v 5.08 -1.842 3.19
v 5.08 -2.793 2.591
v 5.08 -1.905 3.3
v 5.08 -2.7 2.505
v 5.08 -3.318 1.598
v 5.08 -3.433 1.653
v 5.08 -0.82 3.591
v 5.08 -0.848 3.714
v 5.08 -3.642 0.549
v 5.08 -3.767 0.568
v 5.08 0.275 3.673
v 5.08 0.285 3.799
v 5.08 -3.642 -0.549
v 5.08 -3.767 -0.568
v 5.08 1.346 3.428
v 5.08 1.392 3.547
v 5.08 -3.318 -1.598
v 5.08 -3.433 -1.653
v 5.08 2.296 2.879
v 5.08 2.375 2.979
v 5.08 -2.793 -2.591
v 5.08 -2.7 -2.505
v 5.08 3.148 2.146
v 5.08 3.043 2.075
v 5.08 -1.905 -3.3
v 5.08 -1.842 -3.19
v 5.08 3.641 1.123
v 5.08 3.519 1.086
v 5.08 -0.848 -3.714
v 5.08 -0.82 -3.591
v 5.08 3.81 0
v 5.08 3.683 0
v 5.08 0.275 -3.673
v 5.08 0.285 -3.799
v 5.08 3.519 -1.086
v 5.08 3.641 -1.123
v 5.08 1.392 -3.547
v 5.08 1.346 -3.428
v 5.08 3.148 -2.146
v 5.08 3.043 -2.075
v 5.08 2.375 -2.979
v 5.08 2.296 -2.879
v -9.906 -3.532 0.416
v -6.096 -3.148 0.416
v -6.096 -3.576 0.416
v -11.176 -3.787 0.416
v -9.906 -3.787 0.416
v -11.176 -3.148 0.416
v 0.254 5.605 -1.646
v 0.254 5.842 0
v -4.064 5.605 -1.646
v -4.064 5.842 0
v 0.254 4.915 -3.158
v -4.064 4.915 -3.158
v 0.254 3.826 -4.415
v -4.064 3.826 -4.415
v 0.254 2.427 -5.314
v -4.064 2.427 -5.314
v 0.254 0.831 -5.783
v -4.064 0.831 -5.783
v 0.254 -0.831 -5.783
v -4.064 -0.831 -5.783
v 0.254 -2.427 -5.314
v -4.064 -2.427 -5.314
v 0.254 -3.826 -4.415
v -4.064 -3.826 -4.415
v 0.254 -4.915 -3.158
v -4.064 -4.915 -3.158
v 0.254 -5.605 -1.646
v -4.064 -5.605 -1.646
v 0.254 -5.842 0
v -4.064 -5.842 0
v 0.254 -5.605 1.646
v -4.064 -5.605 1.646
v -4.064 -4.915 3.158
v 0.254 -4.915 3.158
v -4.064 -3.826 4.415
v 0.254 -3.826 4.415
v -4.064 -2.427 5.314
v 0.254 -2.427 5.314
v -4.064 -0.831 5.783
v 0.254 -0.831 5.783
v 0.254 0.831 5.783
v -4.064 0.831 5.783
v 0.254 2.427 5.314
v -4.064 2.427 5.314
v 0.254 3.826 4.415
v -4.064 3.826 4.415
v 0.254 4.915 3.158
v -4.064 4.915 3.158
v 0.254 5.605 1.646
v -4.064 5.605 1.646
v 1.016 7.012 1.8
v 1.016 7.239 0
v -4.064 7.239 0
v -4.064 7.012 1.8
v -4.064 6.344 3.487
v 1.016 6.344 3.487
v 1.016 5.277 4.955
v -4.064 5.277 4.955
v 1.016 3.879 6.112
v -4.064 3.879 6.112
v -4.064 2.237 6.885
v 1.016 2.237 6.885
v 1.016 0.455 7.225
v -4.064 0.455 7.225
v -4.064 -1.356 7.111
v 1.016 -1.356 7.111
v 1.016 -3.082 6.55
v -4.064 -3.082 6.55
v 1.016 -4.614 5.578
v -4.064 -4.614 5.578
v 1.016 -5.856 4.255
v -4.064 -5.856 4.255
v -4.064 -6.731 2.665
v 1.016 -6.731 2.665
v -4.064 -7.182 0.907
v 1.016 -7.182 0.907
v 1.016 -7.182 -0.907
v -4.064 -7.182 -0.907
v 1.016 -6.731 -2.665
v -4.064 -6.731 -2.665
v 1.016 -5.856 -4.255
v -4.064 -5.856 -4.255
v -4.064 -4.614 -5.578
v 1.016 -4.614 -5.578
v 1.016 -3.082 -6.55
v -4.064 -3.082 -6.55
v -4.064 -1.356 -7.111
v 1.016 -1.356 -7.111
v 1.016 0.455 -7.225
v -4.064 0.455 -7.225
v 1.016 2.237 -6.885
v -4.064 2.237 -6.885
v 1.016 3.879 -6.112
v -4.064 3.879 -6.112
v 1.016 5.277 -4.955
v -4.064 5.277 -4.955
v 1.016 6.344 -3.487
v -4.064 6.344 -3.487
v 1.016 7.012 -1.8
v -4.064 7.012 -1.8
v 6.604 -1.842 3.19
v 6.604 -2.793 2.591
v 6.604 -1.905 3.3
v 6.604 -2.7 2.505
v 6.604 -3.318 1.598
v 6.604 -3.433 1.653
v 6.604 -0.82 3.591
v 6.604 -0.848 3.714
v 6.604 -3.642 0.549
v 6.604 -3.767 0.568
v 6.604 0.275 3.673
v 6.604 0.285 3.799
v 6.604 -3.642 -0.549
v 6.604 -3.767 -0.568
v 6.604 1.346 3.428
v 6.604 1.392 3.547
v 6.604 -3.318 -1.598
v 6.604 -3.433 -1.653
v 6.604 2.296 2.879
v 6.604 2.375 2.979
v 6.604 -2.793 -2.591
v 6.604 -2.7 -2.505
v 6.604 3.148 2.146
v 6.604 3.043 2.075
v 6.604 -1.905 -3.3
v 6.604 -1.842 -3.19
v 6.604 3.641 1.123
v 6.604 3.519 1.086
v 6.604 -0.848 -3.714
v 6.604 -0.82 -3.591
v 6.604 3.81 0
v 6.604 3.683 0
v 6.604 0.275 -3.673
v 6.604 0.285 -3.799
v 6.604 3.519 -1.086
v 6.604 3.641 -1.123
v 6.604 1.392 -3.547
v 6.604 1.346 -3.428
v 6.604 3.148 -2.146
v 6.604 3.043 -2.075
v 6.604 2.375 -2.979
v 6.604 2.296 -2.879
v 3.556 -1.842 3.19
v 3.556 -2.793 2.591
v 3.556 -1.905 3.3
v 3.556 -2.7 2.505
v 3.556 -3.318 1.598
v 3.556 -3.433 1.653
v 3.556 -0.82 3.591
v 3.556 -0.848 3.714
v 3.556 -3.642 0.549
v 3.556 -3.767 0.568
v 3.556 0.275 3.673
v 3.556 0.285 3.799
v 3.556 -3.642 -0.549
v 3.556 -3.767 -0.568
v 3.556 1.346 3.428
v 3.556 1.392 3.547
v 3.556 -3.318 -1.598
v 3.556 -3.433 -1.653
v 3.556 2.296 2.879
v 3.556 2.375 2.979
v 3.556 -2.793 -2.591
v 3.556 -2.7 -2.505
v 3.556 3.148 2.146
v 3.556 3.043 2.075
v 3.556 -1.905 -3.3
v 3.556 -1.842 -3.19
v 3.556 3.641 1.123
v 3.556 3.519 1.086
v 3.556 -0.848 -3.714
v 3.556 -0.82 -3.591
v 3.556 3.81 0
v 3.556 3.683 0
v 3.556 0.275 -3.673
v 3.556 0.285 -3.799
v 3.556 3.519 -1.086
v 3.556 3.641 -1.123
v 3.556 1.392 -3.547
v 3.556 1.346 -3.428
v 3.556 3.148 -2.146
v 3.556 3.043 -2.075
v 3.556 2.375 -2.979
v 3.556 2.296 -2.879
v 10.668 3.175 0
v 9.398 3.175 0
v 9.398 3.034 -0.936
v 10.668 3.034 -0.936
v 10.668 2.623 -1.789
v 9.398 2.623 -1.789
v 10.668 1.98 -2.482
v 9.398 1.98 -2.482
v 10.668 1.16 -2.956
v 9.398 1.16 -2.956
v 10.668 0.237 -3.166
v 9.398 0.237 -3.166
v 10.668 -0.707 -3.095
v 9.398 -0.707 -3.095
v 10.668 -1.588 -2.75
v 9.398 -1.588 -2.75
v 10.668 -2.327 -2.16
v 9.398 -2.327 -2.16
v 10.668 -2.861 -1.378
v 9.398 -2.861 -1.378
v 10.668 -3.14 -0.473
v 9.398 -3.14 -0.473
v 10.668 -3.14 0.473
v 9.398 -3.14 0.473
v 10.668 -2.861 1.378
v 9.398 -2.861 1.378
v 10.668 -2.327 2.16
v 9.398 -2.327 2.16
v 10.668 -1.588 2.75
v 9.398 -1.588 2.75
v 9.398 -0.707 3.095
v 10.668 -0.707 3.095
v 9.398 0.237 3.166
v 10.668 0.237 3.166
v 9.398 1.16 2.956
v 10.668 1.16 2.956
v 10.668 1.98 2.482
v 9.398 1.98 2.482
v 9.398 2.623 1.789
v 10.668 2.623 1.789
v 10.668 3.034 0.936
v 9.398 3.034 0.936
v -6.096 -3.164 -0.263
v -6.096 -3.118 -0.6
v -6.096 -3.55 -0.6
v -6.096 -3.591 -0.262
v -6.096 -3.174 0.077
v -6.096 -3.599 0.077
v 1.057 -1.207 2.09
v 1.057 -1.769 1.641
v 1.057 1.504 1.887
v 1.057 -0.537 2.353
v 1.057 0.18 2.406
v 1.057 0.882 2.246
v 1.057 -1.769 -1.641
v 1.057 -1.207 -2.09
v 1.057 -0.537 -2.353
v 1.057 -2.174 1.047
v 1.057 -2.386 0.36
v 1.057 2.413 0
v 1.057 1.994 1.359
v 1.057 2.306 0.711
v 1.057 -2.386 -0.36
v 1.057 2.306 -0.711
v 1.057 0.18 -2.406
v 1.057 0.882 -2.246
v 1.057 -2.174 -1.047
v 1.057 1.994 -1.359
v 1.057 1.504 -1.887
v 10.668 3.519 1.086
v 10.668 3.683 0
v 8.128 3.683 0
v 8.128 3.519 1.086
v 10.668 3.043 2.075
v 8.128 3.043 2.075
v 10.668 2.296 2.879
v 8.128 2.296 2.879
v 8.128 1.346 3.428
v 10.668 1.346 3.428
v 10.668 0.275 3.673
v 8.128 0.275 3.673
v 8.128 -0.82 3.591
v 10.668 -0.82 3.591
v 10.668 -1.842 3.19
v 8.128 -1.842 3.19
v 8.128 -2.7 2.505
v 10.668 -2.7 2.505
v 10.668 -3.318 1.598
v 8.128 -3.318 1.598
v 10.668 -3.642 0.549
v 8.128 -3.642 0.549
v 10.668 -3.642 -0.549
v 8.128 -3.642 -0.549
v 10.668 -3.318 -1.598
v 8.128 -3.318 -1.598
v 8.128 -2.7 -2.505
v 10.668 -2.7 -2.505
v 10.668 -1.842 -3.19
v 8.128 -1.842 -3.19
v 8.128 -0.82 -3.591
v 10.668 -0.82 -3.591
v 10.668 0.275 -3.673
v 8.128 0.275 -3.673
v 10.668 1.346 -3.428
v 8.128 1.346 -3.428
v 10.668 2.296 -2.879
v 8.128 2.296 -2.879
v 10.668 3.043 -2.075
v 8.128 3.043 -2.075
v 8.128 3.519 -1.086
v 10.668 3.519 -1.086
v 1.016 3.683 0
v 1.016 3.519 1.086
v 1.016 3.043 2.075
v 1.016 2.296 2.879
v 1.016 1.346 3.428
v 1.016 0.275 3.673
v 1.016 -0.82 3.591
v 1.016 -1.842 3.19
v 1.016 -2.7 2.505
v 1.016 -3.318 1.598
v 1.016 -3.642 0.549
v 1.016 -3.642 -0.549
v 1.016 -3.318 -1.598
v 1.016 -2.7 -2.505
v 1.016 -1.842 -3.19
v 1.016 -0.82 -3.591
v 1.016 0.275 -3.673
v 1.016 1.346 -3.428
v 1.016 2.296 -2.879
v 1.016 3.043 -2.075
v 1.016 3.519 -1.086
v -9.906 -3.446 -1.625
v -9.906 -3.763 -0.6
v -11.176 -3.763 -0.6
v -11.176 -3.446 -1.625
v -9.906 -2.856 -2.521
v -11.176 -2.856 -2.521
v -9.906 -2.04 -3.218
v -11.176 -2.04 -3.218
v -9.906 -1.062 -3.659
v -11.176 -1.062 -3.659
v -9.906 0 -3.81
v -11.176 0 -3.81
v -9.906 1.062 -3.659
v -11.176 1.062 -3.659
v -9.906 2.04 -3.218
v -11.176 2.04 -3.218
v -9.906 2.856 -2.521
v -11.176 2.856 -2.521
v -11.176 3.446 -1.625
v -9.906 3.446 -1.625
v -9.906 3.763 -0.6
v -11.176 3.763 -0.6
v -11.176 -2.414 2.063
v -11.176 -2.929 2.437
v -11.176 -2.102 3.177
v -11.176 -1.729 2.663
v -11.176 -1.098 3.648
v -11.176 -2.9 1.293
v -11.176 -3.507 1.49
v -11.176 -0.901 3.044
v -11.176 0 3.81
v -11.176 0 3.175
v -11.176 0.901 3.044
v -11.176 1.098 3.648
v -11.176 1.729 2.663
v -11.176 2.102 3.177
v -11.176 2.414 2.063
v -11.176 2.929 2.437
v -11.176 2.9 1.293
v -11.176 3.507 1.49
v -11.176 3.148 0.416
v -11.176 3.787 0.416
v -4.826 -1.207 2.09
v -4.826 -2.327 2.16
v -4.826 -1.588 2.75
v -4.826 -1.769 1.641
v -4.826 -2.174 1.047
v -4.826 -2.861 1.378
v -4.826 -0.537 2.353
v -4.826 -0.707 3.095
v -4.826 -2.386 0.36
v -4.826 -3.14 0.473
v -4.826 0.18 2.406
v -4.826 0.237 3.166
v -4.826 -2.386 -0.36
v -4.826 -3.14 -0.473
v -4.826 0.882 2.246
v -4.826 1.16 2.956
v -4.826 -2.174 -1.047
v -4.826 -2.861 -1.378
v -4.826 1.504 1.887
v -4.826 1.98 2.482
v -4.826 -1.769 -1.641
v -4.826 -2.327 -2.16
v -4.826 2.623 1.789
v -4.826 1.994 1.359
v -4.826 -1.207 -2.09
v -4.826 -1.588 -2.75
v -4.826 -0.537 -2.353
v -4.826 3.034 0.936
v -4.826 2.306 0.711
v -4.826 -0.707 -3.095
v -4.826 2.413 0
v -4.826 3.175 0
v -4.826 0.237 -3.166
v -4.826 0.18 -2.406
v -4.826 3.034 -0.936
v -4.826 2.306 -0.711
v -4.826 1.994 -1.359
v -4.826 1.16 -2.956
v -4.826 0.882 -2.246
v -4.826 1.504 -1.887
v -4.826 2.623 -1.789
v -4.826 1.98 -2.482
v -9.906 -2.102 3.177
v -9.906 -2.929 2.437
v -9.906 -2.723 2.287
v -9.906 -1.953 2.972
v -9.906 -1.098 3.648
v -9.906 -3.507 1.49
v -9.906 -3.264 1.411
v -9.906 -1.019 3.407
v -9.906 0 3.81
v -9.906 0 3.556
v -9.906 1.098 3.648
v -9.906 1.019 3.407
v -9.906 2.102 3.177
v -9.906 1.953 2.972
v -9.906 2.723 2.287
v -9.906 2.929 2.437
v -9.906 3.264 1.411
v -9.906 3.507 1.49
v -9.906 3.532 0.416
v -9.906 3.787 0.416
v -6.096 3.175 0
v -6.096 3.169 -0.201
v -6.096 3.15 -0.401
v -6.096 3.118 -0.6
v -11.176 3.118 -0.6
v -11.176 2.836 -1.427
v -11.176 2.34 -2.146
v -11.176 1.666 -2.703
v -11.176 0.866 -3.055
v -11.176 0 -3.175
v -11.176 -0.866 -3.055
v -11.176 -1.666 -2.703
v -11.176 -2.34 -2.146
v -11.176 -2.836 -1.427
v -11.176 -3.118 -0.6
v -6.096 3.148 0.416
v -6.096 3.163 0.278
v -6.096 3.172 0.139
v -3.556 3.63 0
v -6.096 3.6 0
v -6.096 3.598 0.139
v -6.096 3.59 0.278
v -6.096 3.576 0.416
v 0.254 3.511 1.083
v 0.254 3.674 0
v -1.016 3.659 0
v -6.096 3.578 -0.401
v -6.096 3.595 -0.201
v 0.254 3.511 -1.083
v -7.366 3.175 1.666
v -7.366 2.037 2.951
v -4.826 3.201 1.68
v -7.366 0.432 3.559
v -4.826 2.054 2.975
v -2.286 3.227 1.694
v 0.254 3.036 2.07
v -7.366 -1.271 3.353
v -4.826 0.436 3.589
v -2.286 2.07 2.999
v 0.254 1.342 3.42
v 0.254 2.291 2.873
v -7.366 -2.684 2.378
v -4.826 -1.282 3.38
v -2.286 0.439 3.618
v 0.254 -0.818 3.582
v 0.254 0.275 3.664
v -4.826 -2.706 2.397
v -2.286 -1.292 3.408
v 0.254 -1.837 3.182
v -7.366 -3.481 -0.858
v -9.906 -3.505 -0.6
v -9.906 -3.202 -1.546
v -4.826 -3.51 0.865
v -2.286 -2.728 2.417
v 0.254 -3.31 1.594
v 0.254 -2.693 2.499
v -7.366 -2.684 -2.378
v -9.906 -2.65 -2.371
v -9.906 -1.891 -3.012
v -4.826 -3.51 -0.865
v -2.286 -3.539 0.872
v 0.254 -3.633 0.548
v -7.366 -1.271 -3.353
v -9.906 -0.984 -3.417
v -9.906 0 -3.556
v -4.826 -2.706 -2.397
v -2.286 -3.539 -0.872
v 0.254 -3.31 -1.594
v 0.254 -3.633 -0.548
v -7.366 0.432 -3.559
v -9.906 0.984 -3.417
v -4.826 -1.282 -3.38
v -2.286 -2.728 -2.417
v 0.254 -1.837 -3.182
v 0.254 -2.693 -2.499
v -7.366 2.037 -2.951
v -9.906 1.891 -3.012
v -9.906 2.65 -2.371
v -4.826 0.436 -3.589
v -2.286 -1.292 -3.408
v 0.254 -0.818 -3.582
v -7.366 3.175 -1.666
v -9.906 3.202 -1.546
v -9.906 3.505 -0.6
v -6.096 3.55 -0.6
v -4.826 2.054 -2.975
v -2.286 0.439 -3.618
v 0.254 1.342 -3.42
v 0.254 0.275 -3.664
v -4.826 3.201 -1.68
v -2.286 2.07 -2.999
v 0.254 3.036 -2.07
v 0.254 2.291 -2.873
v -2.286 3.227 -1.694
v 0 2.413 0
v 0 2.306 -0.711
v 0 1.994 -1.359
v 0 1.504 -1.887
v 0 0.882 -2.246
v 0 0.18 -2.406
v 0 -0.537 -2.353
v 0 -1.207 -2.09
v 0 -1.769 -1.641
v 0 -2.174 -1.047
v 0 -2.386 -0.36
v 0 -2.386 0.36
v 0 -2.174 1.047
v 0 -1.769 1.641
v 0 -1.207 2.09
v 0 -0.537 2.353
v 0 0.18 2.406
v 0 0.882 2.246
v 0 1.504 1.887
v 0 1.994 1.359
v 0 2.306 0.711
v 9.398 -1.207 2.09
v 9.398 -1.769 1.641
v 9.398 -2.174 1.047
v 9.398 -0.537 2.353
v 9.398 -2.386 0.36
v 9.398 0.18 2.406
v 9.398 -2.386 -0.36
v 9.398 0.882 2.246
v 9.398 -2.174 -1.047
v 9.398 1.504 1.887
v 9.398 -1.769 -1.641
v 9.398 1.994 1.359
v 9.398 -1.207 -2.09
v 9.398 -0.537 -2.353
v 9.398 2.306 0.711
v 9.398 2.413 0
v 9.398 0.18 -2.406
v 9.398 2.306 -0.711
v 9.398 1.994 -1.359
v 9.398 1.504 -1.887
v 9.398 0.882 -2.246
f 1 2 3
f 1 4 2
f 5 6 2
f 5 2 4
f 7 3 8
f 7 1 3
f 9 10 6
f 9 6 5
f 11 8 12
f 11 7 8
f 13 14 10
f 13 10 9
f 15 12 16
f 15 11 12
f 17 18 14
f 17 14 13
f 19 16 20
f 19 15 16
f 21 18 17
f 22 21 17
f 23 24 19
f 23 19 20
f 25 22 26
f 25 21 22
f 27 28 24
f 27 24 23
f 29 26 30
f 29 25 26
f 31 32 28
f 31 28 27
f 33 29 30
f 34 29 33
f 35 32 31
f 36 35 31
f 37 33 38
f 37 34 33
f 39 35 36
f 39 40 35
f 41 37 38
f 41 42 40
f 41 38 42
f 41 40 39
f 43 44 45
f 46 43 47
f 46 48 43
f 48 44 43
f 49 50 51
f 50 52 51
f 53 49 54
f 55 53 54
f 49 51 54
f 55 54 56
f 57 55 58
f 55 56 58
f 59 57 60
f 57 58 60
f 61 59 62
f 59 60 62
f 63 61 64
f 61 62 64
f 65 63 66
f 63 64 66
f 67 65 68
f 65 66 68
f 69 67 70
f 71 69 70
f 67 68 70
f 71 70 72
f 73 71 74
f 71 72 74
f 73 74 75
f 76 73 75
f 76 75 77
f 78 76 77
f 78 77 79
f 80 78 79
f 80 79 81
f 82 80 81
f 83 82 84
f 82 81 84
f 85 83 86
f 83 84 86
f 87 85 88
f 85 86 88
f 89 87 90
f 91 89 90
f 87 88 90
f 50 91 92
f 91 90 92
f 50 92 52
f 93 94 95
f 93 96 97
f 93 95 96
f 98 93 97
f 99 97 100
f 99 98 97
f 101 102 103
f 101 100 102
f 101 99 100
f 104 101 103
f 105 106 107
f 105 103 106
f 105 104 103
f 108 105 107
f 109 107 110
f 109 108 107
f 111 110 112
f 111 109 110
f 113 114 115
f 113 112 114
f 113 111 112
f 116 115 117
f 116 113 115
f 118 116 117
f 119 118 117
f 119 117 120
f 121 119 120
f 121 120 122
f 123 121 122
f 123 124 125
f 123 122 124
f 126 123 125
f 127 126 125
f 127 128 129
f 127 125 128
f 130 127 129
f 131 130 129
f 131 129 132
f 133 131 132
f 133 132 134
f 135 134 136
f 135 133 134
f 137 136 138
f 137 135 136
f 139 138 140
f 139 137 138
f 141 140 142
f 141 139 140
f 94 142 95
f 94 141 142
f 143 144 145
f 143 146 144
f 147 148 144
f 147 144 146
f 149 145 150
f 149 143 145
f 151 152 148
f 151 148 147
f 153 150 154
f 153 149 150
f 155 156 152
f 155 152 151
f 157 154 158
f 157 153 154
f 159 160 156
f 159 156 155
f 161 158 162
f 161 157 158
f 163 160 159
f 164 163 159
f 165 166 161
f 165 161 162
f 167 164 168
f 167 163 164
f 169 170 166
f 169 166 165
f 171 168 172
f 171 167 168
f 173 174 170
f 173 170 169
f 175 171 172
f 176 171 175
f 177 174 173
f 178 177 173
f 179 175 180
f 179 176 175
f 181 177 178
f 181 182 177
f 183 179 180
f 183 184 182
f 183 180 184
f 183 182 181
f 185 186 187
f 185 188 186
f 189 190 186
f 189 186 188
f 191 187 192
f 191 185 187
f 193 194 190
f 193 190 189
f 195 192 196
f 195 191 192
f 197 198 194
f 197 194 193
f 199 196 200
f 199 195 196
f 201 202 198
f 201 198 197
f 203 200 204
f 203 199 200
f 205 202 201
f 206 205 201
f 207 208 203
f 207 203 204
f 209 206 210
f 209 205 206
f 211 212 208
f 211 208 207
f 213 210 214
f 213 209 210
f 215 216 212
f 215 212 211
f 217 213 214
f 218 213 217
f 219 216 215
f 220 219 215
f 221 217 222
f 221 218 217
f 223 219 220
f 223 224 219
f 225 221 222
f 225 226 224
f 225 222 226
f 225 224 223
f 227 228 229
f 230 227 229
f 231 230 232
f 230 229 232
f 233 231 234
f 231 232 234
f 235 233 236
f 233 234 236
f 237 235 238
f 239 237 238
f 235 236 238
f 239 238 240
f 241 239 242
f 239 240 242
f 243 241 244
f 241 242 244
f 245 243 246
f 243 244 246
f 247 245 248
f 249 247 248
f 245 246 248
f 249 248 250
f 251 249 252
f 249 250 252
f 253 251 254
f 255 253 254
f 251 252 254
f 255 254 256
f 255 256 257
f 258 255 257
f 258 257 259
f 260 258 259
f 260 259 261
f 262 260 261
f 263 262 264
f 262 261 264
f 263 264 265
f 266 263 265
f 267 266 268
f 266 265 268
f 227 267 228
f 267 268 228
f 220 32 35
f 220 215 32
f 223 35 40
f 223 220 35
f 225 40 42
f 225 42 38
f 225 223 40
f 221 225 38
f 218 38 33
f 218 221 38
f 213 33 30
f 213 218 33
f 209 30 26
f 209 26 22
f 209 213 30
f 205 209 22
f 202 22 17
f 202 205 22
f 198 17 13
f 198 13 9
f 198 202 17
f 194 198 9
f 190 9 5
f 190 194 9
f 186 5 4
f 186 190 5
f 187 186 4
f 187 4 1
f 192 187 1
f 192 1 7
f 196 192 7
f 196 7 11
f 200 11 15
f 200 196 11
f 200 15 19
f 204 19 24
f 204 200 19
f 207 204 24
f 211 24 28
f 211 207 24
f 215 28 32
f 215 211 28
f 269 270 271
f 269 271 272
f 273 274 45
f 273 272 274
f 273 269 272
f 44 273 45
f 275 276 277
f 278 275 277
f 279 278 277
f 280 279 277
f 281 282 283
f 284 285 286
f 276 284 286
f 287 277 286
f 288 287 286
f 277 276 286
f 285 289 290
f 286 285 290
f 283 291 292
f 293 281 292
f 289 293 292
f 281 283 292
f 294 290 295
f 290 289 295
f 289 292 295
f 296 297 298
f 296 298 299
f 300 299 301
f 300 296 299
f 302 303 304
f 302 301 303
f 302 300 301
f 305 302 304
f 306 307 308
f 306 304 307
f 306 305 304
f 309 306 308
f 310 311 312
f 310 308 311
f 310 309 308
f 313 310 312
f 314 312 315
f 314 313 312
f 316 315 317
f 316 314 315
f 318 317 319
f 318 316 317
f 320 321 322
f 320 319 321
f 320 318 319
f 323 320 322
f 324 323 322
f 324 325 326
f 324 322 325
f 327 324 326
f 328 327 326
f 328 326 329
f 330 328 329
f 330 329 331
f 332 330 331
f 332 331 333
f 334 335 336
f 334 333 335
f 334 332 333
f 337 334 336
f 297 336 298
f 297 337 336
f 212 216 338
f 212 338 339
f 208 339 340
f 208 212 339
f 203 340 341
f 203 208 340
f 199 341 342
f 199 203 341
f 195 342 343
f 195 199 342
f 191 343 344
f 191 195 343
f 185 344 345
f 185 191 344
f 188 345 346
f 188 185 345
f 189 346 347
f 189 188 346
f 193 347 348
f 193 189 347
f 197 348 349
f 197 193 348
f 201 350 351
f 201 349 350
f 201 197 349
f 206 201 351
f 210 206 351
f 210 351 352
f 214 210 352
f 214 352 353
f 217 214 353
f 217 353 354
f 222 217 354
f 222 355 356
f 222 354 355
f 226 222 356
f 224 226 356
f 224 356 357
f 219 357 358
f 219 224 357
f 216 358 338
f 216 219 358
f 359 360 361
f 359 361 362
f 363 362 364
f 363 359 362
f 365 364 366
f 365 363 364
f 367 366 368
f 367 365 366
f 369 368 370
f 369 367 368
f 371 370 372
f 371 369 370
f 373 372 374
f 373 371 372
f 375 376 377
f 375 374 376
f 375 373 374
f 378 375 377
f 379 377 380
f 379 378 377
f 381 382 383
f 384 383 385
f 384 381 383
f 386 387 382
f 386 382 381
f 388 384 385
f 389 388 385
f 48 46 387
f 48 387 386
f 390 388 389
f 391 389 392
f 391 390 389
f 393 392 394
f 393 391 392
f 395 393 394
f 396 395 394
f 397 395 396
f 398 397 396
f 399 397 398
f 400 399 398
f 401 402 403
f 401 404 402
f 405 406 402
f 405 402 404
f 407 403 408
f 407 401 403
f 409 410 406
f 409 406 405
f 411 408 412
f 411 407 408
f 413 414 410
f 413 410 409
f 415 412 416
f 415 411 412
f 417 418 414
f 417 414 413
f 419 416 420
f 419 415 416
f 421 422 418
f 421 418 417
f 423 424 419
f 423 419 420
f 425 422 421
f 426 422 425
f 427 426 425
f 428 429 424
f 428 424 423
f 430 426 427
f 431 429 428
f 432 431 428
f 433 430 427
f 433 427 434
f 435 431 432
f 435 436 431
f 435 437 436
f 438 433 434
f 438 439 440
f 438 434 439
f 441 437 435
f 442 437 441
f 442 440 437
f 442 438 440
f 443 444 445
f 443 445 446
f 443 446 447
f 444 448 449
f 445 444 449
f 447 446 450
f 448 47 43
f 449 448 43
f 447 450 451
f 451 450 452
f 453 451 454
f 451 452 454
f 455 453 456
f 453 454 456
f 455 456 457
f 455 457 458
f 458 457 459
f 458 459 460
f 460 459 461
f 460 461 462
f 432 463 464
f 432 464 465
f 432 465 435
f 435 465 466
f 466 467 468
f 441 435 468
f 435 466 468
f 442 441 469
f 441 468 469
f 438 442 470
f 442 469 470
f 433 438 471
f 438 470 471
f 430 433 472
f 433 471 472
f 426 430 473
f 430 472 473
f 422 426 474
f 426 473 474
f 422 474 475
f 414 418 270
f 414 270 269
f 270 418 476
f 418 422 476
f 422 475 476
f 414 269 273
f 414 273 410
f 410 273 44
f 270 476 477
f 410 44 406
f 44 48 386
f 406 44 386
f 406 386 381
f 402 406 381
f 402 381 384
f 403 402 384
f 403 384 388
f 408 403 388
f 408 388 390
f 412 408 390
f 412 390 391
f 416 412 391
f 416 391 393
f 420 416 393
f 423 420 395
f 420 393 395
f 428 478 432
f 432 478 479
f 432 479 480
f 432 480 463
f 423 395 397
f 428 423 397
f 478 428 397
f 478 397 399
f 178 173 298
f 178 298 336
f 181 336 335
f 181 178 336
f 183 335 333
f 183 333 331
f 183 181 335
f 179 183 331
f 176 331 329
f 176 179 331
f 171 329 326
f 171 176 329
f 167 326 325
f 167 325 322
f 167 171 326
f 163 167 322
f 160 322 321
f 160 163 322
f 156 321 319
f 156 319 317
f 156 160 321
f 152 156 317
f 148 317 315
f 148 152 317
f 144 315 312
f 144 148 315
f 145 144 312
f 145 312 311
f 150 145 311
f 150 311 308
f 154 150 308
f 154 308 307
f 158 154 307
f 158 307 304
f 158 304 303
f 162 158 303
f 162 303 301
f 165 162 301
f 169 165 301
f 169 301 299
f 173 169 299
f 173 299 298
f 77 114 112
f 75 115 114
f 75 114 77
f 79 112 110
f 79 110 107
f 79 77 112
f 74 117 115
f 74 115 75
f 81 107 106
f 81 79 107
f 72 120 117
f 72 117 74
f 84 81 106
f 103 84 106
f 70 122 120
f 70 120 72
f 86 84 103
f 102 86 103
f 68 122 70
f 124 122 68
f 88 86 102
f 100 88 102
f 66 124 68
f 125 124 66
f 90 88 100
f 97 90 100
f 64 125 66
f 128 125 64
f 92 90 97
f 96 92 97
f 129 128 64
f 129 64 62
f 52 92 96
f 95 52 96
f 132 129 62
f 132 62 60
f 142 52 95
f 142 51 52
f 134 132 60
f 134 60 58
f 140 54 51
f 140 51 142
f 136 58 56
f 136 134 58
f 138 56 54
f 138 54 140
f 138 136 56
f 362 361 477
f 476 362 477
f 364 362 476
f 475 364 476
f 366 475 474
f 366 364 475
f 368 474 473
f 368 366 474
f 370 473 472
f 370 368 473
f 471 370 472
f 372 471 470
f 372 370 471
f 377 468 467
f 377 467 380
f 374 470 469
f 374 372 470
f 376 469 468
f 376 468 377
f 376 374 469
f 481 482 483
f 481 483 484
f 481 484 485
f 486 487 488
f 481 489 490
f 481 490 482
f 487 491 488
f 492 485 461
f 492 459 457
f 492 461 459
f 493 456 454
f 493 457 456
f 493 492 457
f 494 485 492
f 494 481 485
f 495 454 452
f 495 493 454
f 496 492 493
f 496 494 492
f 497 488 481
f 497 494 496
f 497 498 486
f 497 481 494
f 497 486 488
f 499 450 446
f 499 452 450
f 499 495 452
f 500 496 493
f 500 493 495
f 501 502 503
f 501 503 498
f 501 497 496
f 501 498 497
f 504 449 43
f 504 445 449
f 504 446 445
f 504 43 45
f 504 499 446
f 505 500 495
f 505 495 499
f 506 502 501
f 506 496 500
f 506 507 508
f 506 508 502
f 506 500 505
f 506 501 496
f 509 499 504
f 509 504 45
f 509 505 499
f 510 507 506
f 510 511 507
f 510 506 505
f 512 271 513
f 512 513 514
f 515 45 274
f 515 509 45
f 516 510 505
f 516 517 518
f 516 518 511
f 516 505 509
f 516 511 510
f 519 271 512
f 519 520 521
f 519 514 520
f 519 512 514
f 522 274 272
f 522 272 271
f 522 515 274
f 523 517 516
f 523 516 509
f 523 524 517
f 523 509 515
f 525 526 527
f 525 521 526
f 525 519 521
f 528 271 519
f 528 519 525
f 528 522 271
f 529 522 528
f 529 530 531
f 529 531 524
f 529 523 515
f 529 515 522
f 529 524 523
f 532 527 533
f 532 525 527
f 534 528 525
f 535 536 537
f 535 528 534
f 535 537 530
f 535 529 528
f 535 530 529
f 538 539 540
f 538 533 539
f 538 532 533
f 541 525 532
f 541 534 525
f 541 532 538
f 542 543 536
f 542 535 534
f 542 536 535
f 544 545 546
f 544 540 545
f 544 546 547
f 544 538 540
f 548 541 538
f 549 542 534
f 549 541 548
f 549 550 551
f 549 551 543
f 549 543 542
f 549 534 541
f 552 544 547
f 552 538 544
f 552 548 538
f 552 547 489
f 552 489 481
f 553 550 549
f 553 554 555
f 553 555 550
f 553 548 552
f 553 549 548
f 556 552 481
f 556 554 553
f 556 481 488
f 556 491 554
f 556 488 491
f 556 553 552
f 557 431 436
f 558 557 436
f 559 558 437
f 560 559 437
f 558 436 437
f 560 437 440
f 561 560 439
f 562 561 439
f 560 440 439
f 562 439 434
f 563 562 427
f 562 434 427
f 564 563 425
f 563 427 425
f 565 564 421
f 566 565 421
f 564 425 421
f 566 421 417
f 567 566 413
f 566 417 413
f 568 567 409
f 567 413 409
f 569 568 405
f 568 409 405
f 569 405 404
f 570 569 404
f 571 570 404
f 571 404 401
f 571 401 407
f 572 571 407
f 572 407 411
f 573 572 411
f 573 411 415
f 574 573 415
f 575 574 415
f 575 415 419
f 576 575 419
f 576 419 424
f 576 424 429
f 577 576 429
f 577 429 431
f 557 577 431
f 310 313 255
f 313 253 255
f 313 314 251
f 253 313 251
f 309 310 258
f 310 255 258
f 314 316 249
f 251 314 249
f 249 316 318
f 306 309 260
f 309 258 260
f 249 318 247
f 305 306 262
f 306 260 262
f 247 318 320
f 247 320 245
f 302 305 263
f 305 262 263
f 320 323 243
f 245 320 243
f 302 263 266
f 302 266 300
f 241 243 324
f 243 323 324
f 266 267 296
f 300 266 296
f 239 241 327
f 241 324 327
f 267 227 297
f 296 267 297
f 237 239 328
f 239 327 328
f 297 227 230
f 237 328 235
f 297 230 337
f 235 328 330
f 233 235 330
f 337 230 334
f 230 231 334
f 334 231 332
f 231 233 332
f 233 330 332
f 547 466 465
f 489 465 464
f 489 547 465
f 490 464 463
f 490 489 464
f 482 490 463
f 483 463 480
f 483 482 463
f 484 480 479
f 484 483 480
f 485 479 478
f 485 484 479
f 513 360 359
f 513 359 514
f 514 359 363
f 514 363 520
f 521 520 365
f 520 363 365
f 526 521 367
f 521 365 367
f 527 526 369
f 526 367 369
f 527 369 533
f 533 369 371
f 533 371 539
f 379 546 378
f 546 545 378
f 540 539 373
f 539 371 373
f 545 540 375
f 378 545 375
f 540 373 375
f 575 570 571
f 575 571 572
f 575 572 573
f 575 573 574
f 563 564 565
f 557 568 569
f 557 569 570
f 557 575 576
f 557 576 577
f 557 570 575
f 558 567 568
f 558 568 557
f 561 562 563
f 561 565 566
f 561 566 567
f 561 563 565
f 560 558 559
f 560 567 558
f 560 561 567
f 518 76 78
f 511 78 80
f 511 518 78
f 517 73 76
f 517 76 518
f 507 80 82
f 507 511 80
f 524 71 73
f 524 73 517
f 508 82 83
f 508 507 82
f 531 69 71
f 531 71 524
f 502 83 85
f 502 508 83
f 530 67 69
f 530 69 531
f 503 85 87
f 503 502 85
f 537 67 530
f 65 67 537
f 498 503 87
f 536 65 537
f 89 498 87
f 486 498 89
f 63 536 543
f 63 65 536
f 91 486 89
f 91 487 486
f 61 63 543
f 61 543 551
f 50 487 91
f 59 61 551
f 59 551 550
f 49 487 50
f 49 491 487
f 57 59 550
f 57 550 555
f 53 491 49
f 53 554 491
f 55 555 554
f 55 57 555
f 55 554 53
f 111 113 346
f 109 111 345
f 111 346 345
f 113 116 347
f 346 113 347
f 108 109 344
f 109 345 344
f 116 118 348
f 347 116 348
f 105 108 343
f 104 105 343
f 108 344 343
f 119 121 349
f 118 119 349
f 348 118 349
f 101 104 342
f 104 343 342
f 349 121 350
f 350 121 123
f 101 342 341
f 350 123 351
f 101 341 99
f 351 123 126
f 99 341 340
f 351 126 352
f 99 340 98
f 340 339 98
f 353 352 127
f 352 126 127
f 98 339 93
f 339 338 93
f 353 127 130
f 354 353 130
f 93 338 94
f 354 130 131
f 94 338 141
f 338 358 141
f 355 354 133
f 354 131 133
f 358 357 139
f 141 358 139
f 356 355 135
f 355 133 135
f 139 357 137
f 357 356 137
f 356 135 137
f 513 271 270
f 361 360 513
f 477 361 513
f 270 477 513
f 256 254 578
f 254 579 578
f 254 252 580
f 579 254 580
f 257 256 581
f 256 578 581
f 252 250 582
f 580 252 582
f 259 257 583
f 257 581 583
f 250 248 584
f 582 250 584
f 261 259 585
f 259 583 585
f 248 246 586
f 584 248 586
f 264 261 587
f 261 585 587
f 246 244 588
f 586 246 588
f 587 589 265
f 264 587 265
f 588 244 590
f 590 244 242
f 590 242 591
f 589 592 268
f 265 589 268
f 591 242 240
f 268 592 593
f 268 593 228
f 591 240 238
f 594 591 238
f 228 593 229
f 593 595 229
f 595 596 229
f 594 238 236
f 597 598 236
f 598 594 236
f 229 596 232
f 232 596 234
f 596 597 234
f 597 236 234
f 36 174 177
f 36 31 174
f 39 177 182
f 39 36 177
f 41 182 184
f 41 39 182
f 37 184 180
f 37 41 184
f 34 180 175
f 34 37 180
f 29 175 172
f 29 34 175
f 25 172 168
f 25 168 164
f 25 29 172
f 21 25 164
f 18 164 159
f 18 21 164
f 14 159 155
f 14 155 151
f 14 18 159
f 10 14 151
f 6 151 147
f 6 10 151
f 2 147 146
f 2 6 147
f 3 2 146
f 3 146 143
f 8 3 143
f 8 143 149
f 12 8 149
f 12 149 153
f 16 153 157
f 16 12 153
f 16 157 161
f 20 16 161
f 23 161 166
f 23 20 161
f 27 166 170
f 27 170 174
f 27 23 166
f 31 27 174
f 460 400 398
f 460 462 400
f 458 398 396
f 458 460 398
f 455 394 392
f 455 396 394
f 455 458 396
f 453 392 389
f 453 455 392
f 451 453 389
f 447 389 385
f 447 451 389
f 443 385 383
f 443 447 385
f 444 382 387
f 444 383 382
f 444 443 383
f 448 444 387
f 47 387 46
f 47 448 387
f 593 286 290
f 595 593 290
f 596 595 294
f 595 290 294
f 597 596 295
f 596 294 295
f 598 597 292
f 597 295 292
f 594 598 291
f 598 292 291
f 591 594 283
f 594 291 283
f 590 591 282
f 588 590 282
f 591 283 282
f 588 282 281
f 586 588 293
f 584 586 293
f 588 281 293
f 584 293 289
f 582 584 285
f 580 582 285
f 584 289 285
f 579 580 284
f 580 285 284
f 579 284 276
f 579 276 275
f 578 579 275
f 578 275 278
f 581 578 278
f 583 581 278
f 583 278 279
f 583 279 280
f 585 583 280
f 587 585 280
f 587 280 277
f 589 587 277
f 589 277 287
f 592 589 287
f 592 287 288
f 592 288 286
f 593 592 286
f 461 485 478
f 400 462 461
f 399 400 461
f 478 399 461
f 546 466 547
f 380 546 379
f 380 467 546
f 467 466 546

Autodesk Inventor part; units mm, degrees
ref_plane "YZ Plane" through (0, 0, 0) normal (1, 0, 0) x (0, 1, 0)
ref_plane "XZ Plane" through (0, 0, 0) normal (0, 1, 0) x (-1, 0, 0)
ref_plane "XY Plane" through (0, 0, 0) normal (0, 0, 1) x (1, 0, 0)
sketch "Sketch1" plane through (0, 0, 0) normal (0, 0, 1) x (1, 0, 0)
  line L0 (0, 0) -> (0, 2.413)
  line L1 (0, 2.413) -> (-4.826, 2.413)
  line L2 (-4.826, 2.413) -> (-4.826, 3.175)
  line L3 (-4.826, 3.175) -> (-11.176, 3.175)
  line L4 (-11.176, 3.175) -> (-11.176, 3.81)
  line L5 (-11.176, 3.81) -> (-9.906, 3.81)
  line L6 (-9.906, 3.81) -> (-9.906, 3.556)
  line L7 (-9.906, 3.556) -> (0.254, 3.6741)
  line L8 (0.254, 3.6741) -> (0.254, 5.842)
  line L9 (0.254, 5.842) -> (-4.064, 5.842)
  line L10 (-4.064, 5.842) -> (-4.064, 7.239)
  line L11 (-4.064, 7.239) -> (1.016, 7.239)
  line L12 (1.016, 7.239) -> (1.016, 3.683)
  line L13 (1.016, 3.683) -> (3.556, 3.683)
  line L14 (3.556, 3.683) -> (3.556, 3.81)
  line L15 (3.556, 3.81) -> (5.08, 3.683)
  line L16 (5.08, 3.683) -> (5.08, 3.81)
  line L17 (5.08, 3.81) -> (6.604, 3.683)
  line L18 (6.604, 3.683) -> (6.604, 3.81)
  line L19 (6.604, 3.81) -> (8.128, 3.683)
  line L20 (8.128, 3.683) -> (10.668, 3.683)
  line L21 (10.668, 3.683) -> (10.668, 3.175)
  line L22 (10.668, 3.175) -> (9.398, 3.175)
  line L23 (9.398, 3.175) -> (9.398, 2.413)
  line L24 (9.398, 2.413) -> (1.057, 2.413)
  line L25 (1.057, 2.413) -> (1.057, 0)
  line L26 (1.057, 0) -> (0, 0)
  dimension "d0" = 21.844
  dimension "d1" = 1.27
  dimension "d2" = 6.35
  dimension "d3" = 11.43
  dimension "d4" = 5.08
  dimension "d5" = 1.524
  dimension "d6" = 1.524
  dimension "d7" = 1.524
  dimension "d8" = 1.27
  dimension "d9" = 2.54
  dimension "d10" = 2.54
  dimension "d11" = 4.826
  dimension "d13" = 5.842
  dimension "d14" = 7.239
  dimension "d15" = 0.254
  dimension "d16" = 0.127
  dimension "d17" = 0.127
  dimension "d18" = 2.413
  dimension "d19" = 3.175
  dimension "d20" = 3.683
  dimension "d21" = 3.81
  dimension "d22" = 3.175
  dimension "d23" = 2.413
revolve "Revolution1" add sketch "Sketch1" angle 360 about axis through (1.057, 0, 0) along (-1, 0, 0)
sketch "Sketch2" plane through (-11.176, 0, 0) normal (-1, 0, 0) x (0, 0, 1)
  circle A0 centre (0, 0) radius 3.81 projected
  line L0 (0.4164, -4.7623) -> (-0.5996, -4.7623)
  line L1 (-0.5996, -4.7623) -> (-0.5996, 4.4311)
  line L2 (-0.5996, 4.4311) -> (0.4164, 4.4311)
  line L3 (0.4164, 4.4311) -> (0.4164, -4.7623)
  dimension "d25" = 1.016
extrude "Extrusion1" cut sketch "Sketch2" against normal blind 5.08 contours L3 A0 L1 | A0 L1 L2 L3 | L3 L0 L1 A0
equation "\"d6\" = d5"
equation "\"d7\" = d6"
properties part number "ARTHURW5.5a AXLE"
